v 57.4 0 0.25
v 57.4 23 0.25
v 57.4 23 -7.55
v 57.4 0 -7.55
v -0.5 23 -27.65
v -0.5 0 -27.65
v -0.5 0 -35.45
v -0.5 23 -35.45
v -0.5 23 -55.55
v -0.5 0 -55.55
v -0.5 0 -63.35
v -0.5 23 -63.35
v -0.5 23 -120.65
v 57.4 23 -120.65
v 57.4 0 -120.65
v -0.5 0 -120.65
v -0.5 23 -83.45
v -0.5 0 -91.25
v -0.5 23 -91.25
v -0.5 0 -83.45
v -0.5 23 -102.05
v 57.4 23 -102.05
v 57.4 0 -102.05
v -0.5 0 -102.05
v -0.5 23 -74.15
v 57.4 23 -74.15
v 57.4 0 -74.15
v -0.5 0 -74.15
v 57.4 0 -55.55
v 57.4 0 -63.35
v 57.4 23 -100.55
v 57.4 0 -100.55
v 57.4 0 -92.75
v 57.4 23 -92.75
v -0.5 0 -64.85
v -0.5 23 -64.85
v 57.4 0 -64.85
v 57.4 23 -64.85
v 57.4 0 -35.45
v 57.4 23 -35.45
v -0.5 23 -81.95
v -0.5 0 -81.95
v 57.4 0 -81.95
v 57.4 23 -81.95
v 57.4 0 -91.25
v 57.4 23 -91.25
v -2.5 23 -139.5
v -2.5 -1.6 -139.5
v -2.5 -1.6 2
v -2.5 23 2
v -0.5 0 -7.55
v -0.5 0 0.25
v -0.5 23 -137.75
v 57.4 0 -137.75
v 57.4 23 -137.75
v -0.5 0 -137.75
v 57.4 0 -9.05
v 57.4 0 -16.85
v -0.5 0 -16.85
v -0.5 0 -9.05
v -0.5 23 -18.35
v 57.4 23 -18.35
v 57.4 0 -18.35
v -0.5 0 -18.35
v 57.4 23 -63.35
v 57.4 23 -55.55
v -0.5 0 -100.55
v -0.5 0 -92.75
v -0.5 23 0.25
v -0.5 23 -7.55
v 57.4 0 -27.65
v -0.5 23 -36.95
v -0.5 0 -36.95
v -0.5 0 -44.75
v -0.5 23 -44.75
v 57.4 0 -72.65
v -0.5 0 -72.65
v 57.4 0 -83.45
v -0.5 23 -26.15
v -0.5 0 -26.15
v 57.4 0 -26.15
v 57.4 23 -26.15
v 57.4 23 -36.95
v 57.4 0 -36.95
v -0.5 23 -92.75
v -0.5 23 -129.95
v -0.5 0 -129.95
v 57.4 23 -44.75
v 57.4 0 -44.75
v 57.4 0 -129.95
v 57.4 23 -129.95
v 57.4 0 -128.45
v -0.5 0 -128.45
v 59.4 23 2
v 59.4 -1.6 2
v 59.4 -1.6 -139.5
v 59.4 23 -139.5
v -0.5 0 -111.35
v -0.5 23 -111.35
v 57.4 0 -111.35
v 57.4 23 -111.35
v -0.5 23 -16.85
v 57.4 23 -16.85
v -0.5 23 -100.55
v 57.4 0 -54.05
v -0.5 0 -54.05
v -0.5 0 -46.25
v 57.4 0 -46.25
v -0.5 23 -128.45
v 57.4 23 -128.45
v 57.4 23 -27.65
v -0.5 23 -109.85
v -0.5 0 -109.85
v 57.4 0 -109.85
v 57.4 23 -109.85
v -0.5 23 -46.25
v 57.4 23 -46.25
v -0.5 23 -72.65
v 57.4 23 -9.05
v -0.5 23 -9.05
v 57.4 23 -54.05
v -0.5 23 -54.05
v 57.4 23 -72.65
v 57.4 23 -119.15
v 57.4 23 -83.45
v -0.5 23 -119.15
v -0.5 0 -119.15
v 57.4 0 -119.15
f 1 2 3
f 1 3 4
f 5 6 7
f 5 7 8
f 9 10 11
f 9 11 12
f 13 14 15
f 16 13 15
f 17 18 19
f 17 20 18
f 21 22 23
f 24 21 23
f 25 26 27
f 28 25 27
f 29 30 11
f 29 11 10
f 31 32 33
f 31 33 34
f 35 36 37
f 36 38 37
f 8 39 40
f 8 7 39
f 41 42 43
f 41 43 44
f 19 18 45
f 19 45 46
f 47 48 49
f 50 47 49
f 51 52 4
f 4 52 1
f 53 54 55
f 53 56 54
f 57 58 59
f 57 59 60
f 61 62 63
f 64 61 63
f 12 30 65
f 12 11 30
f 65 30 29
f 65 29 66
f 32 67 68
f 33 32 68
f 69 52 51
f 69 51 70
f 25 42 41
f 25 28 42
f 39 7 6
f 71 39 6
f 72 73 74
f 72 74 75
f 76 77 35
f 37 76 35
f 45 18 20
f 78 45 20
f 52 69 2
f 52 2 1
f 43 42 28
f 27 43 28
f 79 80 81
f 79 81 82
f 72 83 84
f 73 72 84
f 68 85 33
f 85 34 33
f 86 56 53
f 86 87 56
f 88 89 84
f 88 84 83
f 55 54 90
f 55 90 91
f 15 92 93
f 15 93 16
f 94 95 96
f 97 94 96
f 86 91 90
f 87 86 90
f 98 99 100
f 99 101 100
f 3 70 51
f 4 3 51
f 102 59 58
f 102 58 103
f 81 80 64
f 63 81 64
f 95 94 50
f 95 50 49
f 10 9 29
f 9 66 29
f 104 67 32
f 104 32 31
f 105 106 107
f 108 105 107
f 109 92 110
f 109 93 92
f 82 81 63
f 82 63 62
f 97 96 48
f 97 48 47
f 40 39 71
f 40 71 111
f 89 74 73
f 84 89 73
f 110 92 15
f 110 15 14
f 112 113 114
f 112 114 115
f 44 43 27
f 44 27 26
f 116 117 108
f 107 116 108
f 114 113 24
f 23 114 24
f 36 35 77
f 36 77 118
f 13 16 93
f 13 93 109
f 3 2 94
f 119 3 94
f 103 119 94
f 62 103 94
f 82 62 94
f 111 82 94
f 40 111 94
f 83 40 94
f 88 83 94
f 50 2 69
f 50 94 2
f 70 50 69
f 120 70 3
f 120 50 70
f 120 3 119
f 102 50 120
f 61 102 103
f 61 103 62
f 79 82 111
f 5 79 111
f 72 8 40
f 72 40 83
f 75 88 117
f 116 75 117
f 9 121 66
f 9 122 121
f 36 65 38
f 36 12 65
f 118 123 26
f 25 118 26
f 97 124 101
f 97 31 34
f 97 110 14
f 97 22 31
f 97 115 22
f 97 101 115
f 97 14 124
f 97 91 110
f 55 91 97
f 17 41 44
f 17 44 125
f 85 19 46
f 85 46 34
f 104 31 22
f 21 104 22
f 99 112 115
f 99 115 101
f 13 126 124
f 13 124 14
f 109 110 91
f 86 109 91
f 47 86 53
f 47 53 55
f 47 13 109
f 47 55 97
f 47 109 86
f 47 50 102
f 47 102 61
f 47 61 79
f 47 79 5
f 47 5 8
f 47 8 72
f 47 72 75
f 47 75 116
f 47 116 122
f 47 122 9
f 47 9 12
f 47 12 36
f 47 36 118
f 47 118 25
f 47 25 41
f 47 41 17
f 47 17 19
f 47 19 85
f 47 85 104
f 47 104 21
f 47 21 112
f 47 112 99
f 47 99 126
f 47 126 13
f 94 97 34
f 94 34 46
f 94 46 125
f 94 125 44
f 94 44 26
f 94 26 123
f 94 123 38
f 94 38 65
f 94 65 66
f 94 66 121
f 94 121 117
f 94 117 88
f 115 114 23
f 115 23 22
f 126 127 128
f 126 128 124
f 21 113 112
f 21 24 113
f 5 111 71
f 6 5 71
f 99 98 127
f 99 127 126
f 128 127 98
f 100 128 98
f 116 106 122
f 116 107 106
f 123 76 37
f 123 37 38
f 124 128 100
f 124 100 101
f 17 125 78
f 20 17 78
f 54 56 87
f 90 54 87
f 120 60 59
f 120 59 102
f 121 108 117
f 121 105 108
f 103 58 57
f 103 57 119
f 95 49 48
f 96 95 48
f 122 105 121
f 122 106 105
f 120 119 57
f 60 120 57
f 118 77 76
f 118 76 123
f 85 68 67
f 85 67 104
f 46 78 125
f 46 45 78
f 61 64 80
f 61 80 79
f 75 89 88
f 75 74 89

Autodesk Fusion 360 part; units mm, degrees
sketch "Sketch1" plane through (0, 0, 0) normal (0, 1, 0) x (1, 0, 0)
  line L0 (2.75, 1.25) -> (2.75, 0)
  line L1 (2.75, 1.25) -> (54.15, 1.25)
  line L2 (54.15, 1.25) -> (54.15, 5.25)
  line L3 (54.15, 5.25) -> (2.75, 5.25)
  line L4 (2.75, 5.25) -> (2.75, 1.25)
  line L5 (0, 0) -> (56.9, 0)
  line L6 (56.9, 0) -> (56.9, 7.3)
  line L7 (56.9, 7.3) -> (0, 7.3)
  line L8 (0, 7.3) -> (0, 0)
  line L9 (-2, -2) -> (58.9, -2)
  line L10 (58.9, -2) -> (58.9, 9.3)
  line L11 (58.9, 9.3) -> (-2, 9.3)
  line L12 (-2, 9.3) -> (-2, -2)
  line L13 (58.9, -2) -> (58.9, 9.3)
  line L14 (58.9, 9.3) -> (-2, 9.3)
  line L15 (-2, 9.3) -> (-2, -2)
  line L16 (-2, -2) -> (58.9, -2)
  line L17 (2.75, 1.25) -> (54.15, 1.25)
  line L18 (2.75, 1.25) -> (2.75, 0)
  line L19 (54.15, 1.25) -> (54.15, 5.25)
  line L20 (54.15, 5.25) -> (2.75, 5.25)
  line L21 (2.75, 5.25) -> (2.75, 1.25)
  line L22 (0, 0) -> (56.9, 0)
  line L23 (56.9, 0) -> (56.9, 7.3)
  line L24 (0, 7.3) -> (0, 0)
  line L25 (56.9, 7.3) -> (0, 7.3)
  line L26 (58.9, 7.3) -> (58.9, 18.6)
  line L27 (58.9, 18.6) -> (-2, 18.6)
  line L28 (-2, 18.6) -> (-2, 7.3)
  line L29 (-2, 7.3) -> (58.9, 7.3)
  line L30 (2.75, 10.55) -> (54.15, 10.55)
  line L31 (2.75, 10.55) -> (2.75, 9.3)
  line L32 (54.15, 10.55) -> (54.15, 14.55)
  line L33 (54.15, 14.55) -> (2.75, 14.55)
  line L34 (2.75, 14.55) -> (2.75, 10.55)
  line L35 (0, 9.3) -> (56.9, 9.3)
  line L36 (56.9, 9.3) -> (56.9, 16.6)
  line L37 (0, 16.6) -> (0, 9.3)
  line L38 (56.9, 16.6) -> (0, 16.6)
  line L39 (58.9, 16.6) -> (58.9, 27.9)
  line L40 (58.9, 27.9) -> (-2, 27.9)
  line L41 (-2, 27.9) -> (-2, 16.6)
  line L42 (-2, 16.6) -> (58.9, 16.6)
  line L43 (2.75, 19.85) -> (54.15, 19.85)
  line L44 (2.75, 19.85) -> (2.75, 18.6)
  line L45 (54.15, 19.85) -> (54.15, 23.85)
  line L46 (54.15, 23.85) -> (2.75, 23.85)
  line L47 (2.75, 23.85) -> (2.75, 19.85)
  line L48 (0, 18.6) -> (56.9, 18.6)
  line L49 (56.9, 18.6) -> (56.9, 25.9)
  line L50 (0, 25.9) -> (0, 18.6)
  line L51 (56.9, 25.9) -> (0, 25.9)
  line L52 (58.9, 25.9) -> (58.9, 37.2)
  line L53 (58.9, 37.2) -> (-2, 37.2)
  line L54 (-2, 37.2) -> (-2, 25.9)
  line L55 (-2, 25.9) -> (58.9, 25.9)
  line L56 (2.75, 29.15) -> (54.15, 29.15)
  line L57 (2.75, 29.15) -> (2.75, 27.9)
  line L58 (54.15, 29.15) -> (54.15, 33.15)
  line L59 (54.15, 33.15) -> (2.75, 33.15)
  line L60 (2.75, 33.15) -> (2.75, 29.15)
  line L61 (0, 27.9) -> (56.9, 27.9)
  line L62 (56.9, 27.9) -> (56.9, 35.2)
  line L63 (0, 35.2) -> (0, 27.9)
  line L64 (56.9, 35.2) -> (0, 35.2)
  line L65 (58.9, 35.2) -> (58.9, 46.5)
  line L66 (58.9, 46.5) -> (-2, 46.5)
  line L67 (-2, 46.5) -> (-2, 35.2)
  line L68 (-2, 35.2) -> (58.9, 35.2)
  line L69 (2.75, 38.45) -> (54.15, 38.45)
  line L70 (2.75, 38.45) -> (2.75, 37.2)
  line L71 (54.15, 38.45) -> (54.15, 42.45)
  line L72 (54.15, 42.45) -> (2.75, 42.45)
  line L73 (2.75, 42.45) -> (2.75, 38.45)
  line L74 (0, 37.2) -> (56.9, 37.2)
  line L75 (56.9, 37.2) -> (56.9, 44.5)
  line L76 (0, 44.5) -> (0, 37.2)
  line L77 (56.9, 44.5) -> (0, 44.5)
  line L78 (58.9, 44.5) -> (58.9, 55.8)
  line L79 (58.9, 55.8) -> (-2, 55.8)
  line L80 (-2, 55.8) -> (-2, 44.5)
  line L81 (-2, 44.5) -> (58.9, 44.5)
  line L82 (2.75, 47.75) -> (54.15, 47.75)
  line L83 (2.75, 47.75) -> (2.75, 46.5)
  line L84 (54.15, 47.75) -> (54.15, 51.75)
  line L85 (54.15, 51.75) -> (2.75, 51.75)
  line L86 (2.75, 51.75) -> (2.75, 47.75)
  line L87 (0, 46.5) -> (56.9, 46.5)
  line L88 (56.9, 46.5) -> (56.9, 53.8)
  line L89 (0, 53.8) -> (0, 46.5)
  line L90 (56.9, 53.8) -> (0, 53.8)
  line L91 (58.9, 53.8) -> (58.9, 65.1)
  line L92 (58.9, 65.1) -> (-2, 65.1)
  line L93 (-2, 65.1) -> (-2, 53.8)
  line L94 (-2, 53.8) -> (58.9, 53.8)
  line L95 (2.75, 57.05) -> (54.15, 57.05)
  line L96 (2.75, 57.05) -> (2.75, 55.8)
  line L97 (54.15, 57.05) -> (54.15, 61.05)
  line L98 (54.15, 61.05) -> (2.75, 61.05)
  line L99 (2.75, 61.05) -> (2.75, 57.05)
  line L100 (0, 55.8) -> (56.9, 55.8)
  line L101 (56.9, 55.8) -> (56.9, 63.1)
  line L102 (0, 63.1) -> (0, 55.8)
  line L103 (56.9, 63.1) -> (0, 63.1)
  line L104 (58.9, 63.1) -> (58.9, 74.4)
  line L105 (58.9, 74.4) -> (-2, 74.4)
  line L106 (-2, 74.4) -> (-2, 63.1)
  line L107 (-2, 63.1) -> (58.9, 63.1)
  line L108 (2.75, 66.35) -> (54.15, 66.35)
  line L109 (2.75, 66.35) -> (2.75, 65.1)
  line L110 (54.15, 66.35) -> (54.15, 70.35)
  line L111 (54.15, 70.35) -> (2.75, 70.35)
  line L112 (2.75, 70.35) -> (2.75, 66.35)
  line L113 (0, 65.1) -> (56.9, 65.1)
  line L114 (56.9, 65.1) -> (56.9, 72.4)
  line L115 (0, 72.4) -> (0, 65.1)
  line L116 (56.9, 72.4) -> (0, 72.4)
  line L117 (58.9, 72.4) -> (58.9, 83.7)
  line L118 (58.9, 83.7) -> (-2, 83.7)
  line L119 (-2, 83.7) -> (-2, 72.4)
  line L120 (-2, 72.4) -> (58.9, 72.4)
  line L121 (2.75, 75.65) -> (54.15, 75.65)
  line L122 (2.75, 75.65) -> (2.75, 74.4)
  line L123 (54.15, 75.65) -> (54.15, 79.65)
  line L124 (54.15, 79.65) -> (2.75, 79.65)
  line L125 (2.75, 79.65) -> (2.75, 75.65)
  line L126 (0, 74.4) -> (56.9, 74.4)
  line L127 (56.9, 74.4) -> (56.9, 81.7)
  line L128 (0, 81.7) -> (0, 74.4)
  line L129 (56.9, 81.7) -> (0, 81.7)
  line L130 (58.9, 81.7) -> (58.9, 93)
  line L131 (58.9, 93) -> (-2, 93)
  line L132 (-2, 93) -> (-2, 81.7)
  line L133 (-2, 81.7) -> (58.9, 81.7)
  line L134 (2.75, 84.95) -> (54.15, 84.95)
  line L135 (2.75, 84.95) -> (2.75, 83.7)
  line L136 (54.15, 84.95) -> (54.15, 88.95)
  line L137 (54.15, 88.95) -> (2.75, 88.95)
  line L138 (2.75, 88.95) -> (2.75, 84.95)
  line L139 (0, 83.7) -> (56.9, 83.7)
  line L140 (56.9, 83.7) -> (56.9, 91)
  line L141 (0, 91) -> (0, 83.7)
  line L142 (56.9, 91) -> (0, 91)
  line L143 (58.9, 91) -> (58.9, 102.3)
  line L144 (58.9, 102.3) -> (-2, 102.3)
  line L145 (-2, 102.3) -> (-2, 91)
  line L146 (-2, 91) -> (58.9, 91)
  line L147 (2.75, 94.25) -> (54.15, 94.25)
  line L148 (2.75, 94.25) -> (2.75, 93)
  line L149 (54.15, 94.25) -> (54.15, 98.25)
  line L150 (54.15, 98.25) -> (2.75, 98.25)
  line L151 (2.75, 98.25) -> (2.75, 94.25)
  line L152 (0, 93) -> (56.9, 93)
  line L153 (56.9, 93) -> (56.9, 100.3)
  line L154 (0, 100.3) -> (0, 93)
  line L155 (56.9, 100.3) -> (0, 100.3)
  line L156 (58.9, 100.3) -> (58.9, 111.6)
  line L157 (58.9, 111.6) -> (-2, 111.6)
  line L158 (-2, 111.6) -> (-2, 100.3)
  line L159 (-2, 100.3) -> (58.9, 100.3)
  line L160 (2.75, 103.55) -> (54.15, 103.55)
  line L161 (2.75, 103.55) -> (2.75, 102.3)
  line L162 (54.15, 103.55) -> (54.15, 107.55)
  line L163 (54.15, 107.55) -> (2.75, 107.55)
  line L164 (2.75, 107.55) -> (2.75, 103.55)
  line L165 (0, 102.3) -> (56.9, 102.3)
  line L166 (56.9, 102.3) -> (56.9, 109.6)
  line L167 (0, 109.6) -> (0, 102.3)
  line L168 (56.9, 109.6) -> (0, 109.6)
  line L169 (58.9, 109.6) -> (58.9, 120.9)
  line L170 (58.9, 120.9) -> (-2, 120.9)
  line L171 (-2, 120.9) -> (-2, 109.6)
  line L172 (-2, 109.6) -> (58.9, 109.6)
  line L173 (2.75, 112.85) -> (54.15, 112.85)
  line L174 (2.75, 112.85) -> (2.75, 111.6)
  line L175 (54.15, 112.85) -> (54.15, 116.85)
  line L176 (54.15, 116.85) -> (2.75, 116.85)
  line L177 (2.75, 116.85) -> (2.75, 112.85)
  line L178 (0, 111.6) -> (56.9, 111.6)
  line L179 (56.9, 111.6) -> (56.9, 118.9)
  line L180 (0, 118.9) -> (0, 111.6)
  line L181 (56.9, 118.9) -> (0, 118.9)
  line L182 (58.9, 118.9) -> (58.9, 130.2)
  line L183 (58.9, 130.2) -> (-2, 130.2)
  line L184 (-2, 130.2) -> (-2, 118.9)
  line L185 (-2, 118.9) -> (58.9, 118.9)
  line L186 (2.75, 122.15) -> (54.15, 122.15)
  line L187 (2.75, 122.15) -> (2.75, 120.9)
  line L188 (54.15, 122.15) -> (54.15, 126.15)
  line L189 (54.15, 126.15) -> (2.75, 126.15)
  line L190 (2.75, 126.15) -> (2.75, 122.15)
  line L191 (0, 120.9) -> (56.9, 120.9)
  line L192 (56.9, 120.9) -> (56.9, 128.2)
  line L193 (0, 128.2) -> (0, 120.9)
  line L194 (56.9, 128.2) -> (0, 128.2)
  line L195 (58.9, 128.2) -> (58.9, 139.5)
  line L196 (58.9, 139.5) -> (-2, 139.5)
  line L197 (-2, 139.5) -> (-2, 128.2)
  line L198 (-2, 128.2) -> (58.9, 128.2)
  line L199 (2.75, 131.45) -> (54.15, 131.45)
  line L200 (2.75, 131.45) -> (2.75, 130.2)
  line L201 (54.15, 131.45) -> (54.15, 135.45)
  line L202 (54.15, 135.45) -> (2.75, 135.45)
  line L203 (2.75, 135.45) -> (2.75, 131.45)
  line L204 (0, 130.2) -> (56.9, 130.2)
  line L205 (56.9, 130.2) -> (56.9, 137.5)
  line L206 (0, 137.5) -> (0, 130.2)
  line L207 (56.9, 137.5) -> (0, 137.5)
  point P0 (0, 9.3)
  point P1 (0, 18.6)
  point P2 (0, 27.9)
  point P3 (0, 37.2)
  point P4 (0, 46.5)
  point P5 (0, 55.8)
  point P6 (0, 65.1)
  point P7 (0, 74.4)
  point P8 (0, 83.7)
  point P9 (0, 93)
  point P10 (0, 102.3)
  point P11 (0, 111.6)
  point P12 (0, 120.9)
  point P13 (0, 130.2)
extrude "Extrude1" add sketch "Sketch1" along normal blind 9 contours L5 L6 L8 L9 L10 L12 L13 L15 L16 L22 L23 L24 L29 | L1 L2 L3 L4 L17 L19 L20 L21 | L7 L10 L11 L12 L13 L14 L15 L25 L26 L28 L29 L35 | L11 L14 L28 L37 L42 | L11 L14 L26 L36 L42 | L30 L32 L33 L34 | L26 L27 L28 L38 L39 L41 L42 L48 | L27 L41 L50 L55 | L27 L39 L49 L55 | L43 L45 L46 L47 | L39 L40 L41 L51 L52 L54 L55 L61 | L40 L54 L63 L68 | L40 L52 L62 L68 | L56 L58 L59 L60 | L52 L53 L54 L64 L65 L67 L68 L74 | L53 L67 L76 L81 | L53 L65 L75 L81 | L69 L71 L72 L73 | L65 L66 L67 L77 L78 L80 L81 L87 | L66 L80 L89 L94 | L66 L78 L88 L94 | L82 L84 L85 L86 | L78 L79 L80 L90 L91 L93 L94 L100 | L79 L93 L102 L107 | L79 L91 L101 L107 | L95 L97 L98 L99 | L91 L92 L93 L103 L104 L106 L107 L113 | L92 L106 L115 L120 | L92 L104 L114 L120 | L108 L110 L111 L112 | L104 L105 L106 L116 L117 L119 L120 L126 | L105 L119 L128 L133 | L105 L117 L127 L133 | L121 L123 L124 L125 | L117 L118 L119 L129 L130 L132 L133 L139 | L118 L132 L141 L146 | L118 L130 L140 L146 | L134 L136 L137 L138 | L130 L131 L132 L142 L143 L145 L146 L152 | L131 L145 L154 L159 | L131 L143 L153 L159 | L147 L149 L150 L151 | L143 L144 L145 L155 L156 L158 L159 L165 | L144 L158 L167 L172 | L144 L156 L166 L172 | L160 L162 L163 L164 | L156 L157 L158 L168 L169 L171 L172 L178 | L157 L171 L180 L185 | L157 L169 L179 L185 | L173 L175 L176 L177 | L169 L170 L171 L181 L182 L184 L185 L191 | L170 L184 L193 L198 | L170 L182 L192 L198 | L186 L188 L189 L190 | L182 L183 L184 L194 L195 L197 L198 L204 | L183 L195 L196 L197 L205 L206 L207 | L199 L201 L202 L203 makes body 1 at (37.0167, 3, -5.25) makes body 2 at (37.0167, 3, -51.75) makes body 3 at (37.0167, 3, -88.95) makes body 4 at (37.0167, 3, -126.15) makes body 5 at (37.0167, 3, -116.85) makes body 6 at (37.0167, 3, -79.65) makes body 7 at (37.0167, 3, -42.45) makes body 8 at (37.0167, 3, -33.15) makes body 9 at (37.0167, 3, -14.55) makes body 10 at (37.0167, 3, -61.05) makes body 11 at (37.0167, 3, -98.25) makes body 12 at (37.0167, 3, -135.45) makes body 13 at (37.0167, 3, -107.55) makes body 14 at (37.0167, 3, -70.35) makes body 15 at (37.0167, 3, -23.85) makes body 16 at (58.2333, 0, -83.0333)
sketch "Sketch2" plane through (0, 0, 0) normal (0, 1, 0) x (1, 0, 0)
  line L0 (-2, -2) -> (58.9, -2)
  line L1 (58.9, -2) -> (58.9, 139.5)
  line L2 (58.9, 139.5) -> (-2, 139.5)
  line L3 (-2, 139.5) -> (-2, -2)
  point P0 (-2, -2)
  point P1 (58.9, 139.5)
extrude "Extrude2" add sketch "Sketch2" against normal blind 1.6 bodies 1 2 3 4 5 6 7 8 9 10 11 12 13 14 15 16
extrude "Extrude3" add 1 faces at (58.2333, 9, -73.7333) along direction (0, 1, 0) blind 14 on bodies 1 bodies 1
extrude "Extrude4" cut 15 faces at (0, 15.3333, -135.0667) (0, 15.3333, -123.3333) (0, 15.3333, -114.0333) (0, 15.3333, -104.7333) (0, 15.3333, -97.8667) (0, 15.3333, -86.1333) (0, 15.3333, -79.2667) (0, 15.3333, -69.9667) (0, 15.3333, -58.2333) (0, 15.3333, -51.3667) (0, 15.3333, -42.0667) (0, 15.3333, -30.3333) (0, 15.3333, -21.0333) (0, 7.6667, -14.1667) (0, 15.3333, -4.8667) along direction (-1, 0, 0) blind 0.5 on bodies 1 bodies 1
extrude "Extrude5" add 1 faces at (-2, 6.6, -92.3333) along direction (-1, 0, 0) blind 0.5 on bodies 1 bodies 1
extrude "Extrude6" cut 15 faces at (56.9, 15.3333, -14.1667) (56.9, 15.3333, -2.4333) (56.9, 15.3333, -23.4667) (56.9, 15.3333, -32.7667) (56.9, 15.3333, -42.0667) (56.9, 15.3333, -51.3667) (56.9, 15.3333, -60.6667) (56.9, 15.3333, -67.5333) (56.9, 15.3333, -76.8333) (56.9, 15.3333, -88.5667) (56.9, 15.3333, -95.4333) (56.9, 15.3333, -104.7333) (56.9, 15.3333, -116.4667) (56.9, 15.3333, -125.7667) (56.9, 15.3333, -132.6333) along direction (1, 0, 0) blind 0.5 on bodies 1 bodies 1
extrude "Extrude7" add 1 faces at (58.9, 14.8, -45.1667) along direction (1, 0, 0) blind 0.5 on bodies 1 bodies 1
extrude "Extrude8" cut 1 faces at (18.8, 7.6667, -130.2) along direction (0, 0, 1) blind 0.25 on bodies 1 bodies 1
extrude "Extrude9" cut 1 faces at (18.8, 7.6667, -120.9) along direction (0, 0, 1) blind 0.25 on bodies 1 bodies 1
extrude "Extrude10" cut 1 faces at (38.1, 15.3333, -111.6) along direction (0, 0, 1) blind 0.25 on bodies 1 bodies 1
extrude "Extrude11" cut 1 faces at (38.1, 15.3333, -102.3) along direction (0, 0, 1) blind 0.25 on bodies 1 bodies 1
extrude "Extrude12" cut 1 faces at (38.1, 15.3333, -93) along direction (0, 0, 1) blind 0.25 on bodies 1 bodies 1
extrude "Extrude13" cut 1 faces at (18.8, 7.6667, -83.7) along direction (0, 0, 1) blind 0.25 on bodies 1 bodies 1
extrude "Extrude14" cut 1 faces at (18.8, 7.6667, -74.4) along direction (0, 0, 1) blind 0.25 on bodies 1 bodies 1
extrude "Extrude15" cut 1 faces at (38.1, 15.3333, -65.1) along direction (0, 0, 1) blind 0.25 on bodies 1 bodies 1
extrude "Extrude16" cut 1 faces at (38.1, 15.3333, -55.8) along direction (0, 0, 1) blind 0.25 on bodies 1 bodies 1
extrude "Extrude17" cut 1 faces at (18.8, 7.6667, -46.5) along direction (0, 0, 1) blind 0.25 on bodies 1 bodies 1
extrude "Extrude18" cut 1 faces at (18.8, 7.6667, -37.2) along direction (0, 0, 1) blind 0.25 on bodies 1 bodies 1
extrude "Extrude19" cut 1 faces at (38.1, 15.3333, -27.9) along direction (0, 0, 1) blind 0.25 on bodies 1 bodies 1
extrude "Extrude20" cut 1 faces at (38.1, 15.3333, -18.6) along direction (0, 0, 1) blind 0.25 on bodies 1 bodies 1
extrude "Extrude21" cut 1 faces at (18.8, 7.6667, -9.3) along direction (0, 0, 1) blind 0.25 on bodies 1 bodies 1
extrude "Extrude22" cut 1 faces at (38.1, 7.6667, 0) along direction (0, 0, 1) blind 0.25 on bodies 1 bodies 1
extrude "Extrude23" cut 1 faces at (18.8, 7.6667, -7.3) along direction (0, 0, -1) blind 0.25 on bodies 1 bodies 1
extrude "Extrude24" cut 1 faces at (18.8, 15.3333, -16.6) along direction (0, 0, -1) blind 0.25 on bodies 1 bodies 1
extrude "Extrude25" cut 1 faces at (18.8, 7.6667, -25.9) along direction (0, 0, -1) blind 0.25 on bodies 1 bodies 1
extrude "Extrude26" cut 1 faces at (38.1, 15.3333, -35.2) along direction (0, 0, -1) blind 0.25 on bodies 1 bodies 1
extrude "Extrude27" cut 1 faces at (38.1, 15.3333, -44.5) along direction (0, 0, -1) blind 0.25 on bodies 1 bodies 1
extrude "Extrude28" cut 1 faces at (38.1, 15.3333, -53.8) along direction (0, 0, -1) blind 0.25 on bodies 1 bodies 1
extrude "Extrude29" cut 1 faces at (38.1, 15.3333, -63.1) along direction (0, 0, -1) blind 0.25 on bodies 1 bodies 1
extrude "Extrude30" cut 1 faces at (38.1, 15.3333, -72.4) along direction (0, 0, -1) blind 0.25 on bodies 1 bodies 1
extrude "Extrude31" cut 1 faces at (18.8, 7.6667, -81.7) along direction (0, 0, -1) blind 0.25 on bodies 1 bodies 1
extrude "Extrude32" cut 1 faces at (38.1, 15.3333, -91) along direction (0, 0, -1) blind 0.25 on bodies 1 bodies 1
extrude "Extrude33" cut 1 faces at (18.8, 7.6667, -100.3) along direction (0, 0, -1) blind 0.25 on bodies 1 bodies 1
extrude "Extrude34" cut 1 faces at (38.1, 15.3333, -109.6) along direction (0, 0, -1) blind 0.25 on bodies 1 bodies 1
extrude "Extrude35" cut 1 faces at (38.1, 15.3333, -118.9) along direction (0, 0, -1) blind 0.25 on bodies 1 bodies 1
extrude "Extrude36" cut 1 faces at (38.1, 15.3333, -128.2) along direction (0, 0, -1) blind 0.25 on bodies 1 bodies 1
extrude "Extrude37" cut 1 faces at (18.8, 7.6667, -137.5) along direction (0, 0, -1) blind 0.25 on bodies 1 bodies 1
extrude "Extrude38" cut 15 faces at (19.8833, 9, -3.9167) (19.8833, 9, -13.2167) (19.8833, 9, -22.5167) (19.8833, 9, -31.8167) (19.8833, 9, -41.1167) (19.8833, 9, -50.4167) (19.8833, 9, -59.7167) (19.8833, 9, -69.0167) (19.8833, 9, -78.3167) (19.8833, 9, -87.6167) (19.8833, 9, -96.9167) (19.8833, 9, -106.2167) (19.8833, 9, -115.5167) (19.8833, 9, -124.8167) (19.8833, 9, -134.1167) along direction (0, -1, 0) blind 9 on bodies 1 bodies 1
